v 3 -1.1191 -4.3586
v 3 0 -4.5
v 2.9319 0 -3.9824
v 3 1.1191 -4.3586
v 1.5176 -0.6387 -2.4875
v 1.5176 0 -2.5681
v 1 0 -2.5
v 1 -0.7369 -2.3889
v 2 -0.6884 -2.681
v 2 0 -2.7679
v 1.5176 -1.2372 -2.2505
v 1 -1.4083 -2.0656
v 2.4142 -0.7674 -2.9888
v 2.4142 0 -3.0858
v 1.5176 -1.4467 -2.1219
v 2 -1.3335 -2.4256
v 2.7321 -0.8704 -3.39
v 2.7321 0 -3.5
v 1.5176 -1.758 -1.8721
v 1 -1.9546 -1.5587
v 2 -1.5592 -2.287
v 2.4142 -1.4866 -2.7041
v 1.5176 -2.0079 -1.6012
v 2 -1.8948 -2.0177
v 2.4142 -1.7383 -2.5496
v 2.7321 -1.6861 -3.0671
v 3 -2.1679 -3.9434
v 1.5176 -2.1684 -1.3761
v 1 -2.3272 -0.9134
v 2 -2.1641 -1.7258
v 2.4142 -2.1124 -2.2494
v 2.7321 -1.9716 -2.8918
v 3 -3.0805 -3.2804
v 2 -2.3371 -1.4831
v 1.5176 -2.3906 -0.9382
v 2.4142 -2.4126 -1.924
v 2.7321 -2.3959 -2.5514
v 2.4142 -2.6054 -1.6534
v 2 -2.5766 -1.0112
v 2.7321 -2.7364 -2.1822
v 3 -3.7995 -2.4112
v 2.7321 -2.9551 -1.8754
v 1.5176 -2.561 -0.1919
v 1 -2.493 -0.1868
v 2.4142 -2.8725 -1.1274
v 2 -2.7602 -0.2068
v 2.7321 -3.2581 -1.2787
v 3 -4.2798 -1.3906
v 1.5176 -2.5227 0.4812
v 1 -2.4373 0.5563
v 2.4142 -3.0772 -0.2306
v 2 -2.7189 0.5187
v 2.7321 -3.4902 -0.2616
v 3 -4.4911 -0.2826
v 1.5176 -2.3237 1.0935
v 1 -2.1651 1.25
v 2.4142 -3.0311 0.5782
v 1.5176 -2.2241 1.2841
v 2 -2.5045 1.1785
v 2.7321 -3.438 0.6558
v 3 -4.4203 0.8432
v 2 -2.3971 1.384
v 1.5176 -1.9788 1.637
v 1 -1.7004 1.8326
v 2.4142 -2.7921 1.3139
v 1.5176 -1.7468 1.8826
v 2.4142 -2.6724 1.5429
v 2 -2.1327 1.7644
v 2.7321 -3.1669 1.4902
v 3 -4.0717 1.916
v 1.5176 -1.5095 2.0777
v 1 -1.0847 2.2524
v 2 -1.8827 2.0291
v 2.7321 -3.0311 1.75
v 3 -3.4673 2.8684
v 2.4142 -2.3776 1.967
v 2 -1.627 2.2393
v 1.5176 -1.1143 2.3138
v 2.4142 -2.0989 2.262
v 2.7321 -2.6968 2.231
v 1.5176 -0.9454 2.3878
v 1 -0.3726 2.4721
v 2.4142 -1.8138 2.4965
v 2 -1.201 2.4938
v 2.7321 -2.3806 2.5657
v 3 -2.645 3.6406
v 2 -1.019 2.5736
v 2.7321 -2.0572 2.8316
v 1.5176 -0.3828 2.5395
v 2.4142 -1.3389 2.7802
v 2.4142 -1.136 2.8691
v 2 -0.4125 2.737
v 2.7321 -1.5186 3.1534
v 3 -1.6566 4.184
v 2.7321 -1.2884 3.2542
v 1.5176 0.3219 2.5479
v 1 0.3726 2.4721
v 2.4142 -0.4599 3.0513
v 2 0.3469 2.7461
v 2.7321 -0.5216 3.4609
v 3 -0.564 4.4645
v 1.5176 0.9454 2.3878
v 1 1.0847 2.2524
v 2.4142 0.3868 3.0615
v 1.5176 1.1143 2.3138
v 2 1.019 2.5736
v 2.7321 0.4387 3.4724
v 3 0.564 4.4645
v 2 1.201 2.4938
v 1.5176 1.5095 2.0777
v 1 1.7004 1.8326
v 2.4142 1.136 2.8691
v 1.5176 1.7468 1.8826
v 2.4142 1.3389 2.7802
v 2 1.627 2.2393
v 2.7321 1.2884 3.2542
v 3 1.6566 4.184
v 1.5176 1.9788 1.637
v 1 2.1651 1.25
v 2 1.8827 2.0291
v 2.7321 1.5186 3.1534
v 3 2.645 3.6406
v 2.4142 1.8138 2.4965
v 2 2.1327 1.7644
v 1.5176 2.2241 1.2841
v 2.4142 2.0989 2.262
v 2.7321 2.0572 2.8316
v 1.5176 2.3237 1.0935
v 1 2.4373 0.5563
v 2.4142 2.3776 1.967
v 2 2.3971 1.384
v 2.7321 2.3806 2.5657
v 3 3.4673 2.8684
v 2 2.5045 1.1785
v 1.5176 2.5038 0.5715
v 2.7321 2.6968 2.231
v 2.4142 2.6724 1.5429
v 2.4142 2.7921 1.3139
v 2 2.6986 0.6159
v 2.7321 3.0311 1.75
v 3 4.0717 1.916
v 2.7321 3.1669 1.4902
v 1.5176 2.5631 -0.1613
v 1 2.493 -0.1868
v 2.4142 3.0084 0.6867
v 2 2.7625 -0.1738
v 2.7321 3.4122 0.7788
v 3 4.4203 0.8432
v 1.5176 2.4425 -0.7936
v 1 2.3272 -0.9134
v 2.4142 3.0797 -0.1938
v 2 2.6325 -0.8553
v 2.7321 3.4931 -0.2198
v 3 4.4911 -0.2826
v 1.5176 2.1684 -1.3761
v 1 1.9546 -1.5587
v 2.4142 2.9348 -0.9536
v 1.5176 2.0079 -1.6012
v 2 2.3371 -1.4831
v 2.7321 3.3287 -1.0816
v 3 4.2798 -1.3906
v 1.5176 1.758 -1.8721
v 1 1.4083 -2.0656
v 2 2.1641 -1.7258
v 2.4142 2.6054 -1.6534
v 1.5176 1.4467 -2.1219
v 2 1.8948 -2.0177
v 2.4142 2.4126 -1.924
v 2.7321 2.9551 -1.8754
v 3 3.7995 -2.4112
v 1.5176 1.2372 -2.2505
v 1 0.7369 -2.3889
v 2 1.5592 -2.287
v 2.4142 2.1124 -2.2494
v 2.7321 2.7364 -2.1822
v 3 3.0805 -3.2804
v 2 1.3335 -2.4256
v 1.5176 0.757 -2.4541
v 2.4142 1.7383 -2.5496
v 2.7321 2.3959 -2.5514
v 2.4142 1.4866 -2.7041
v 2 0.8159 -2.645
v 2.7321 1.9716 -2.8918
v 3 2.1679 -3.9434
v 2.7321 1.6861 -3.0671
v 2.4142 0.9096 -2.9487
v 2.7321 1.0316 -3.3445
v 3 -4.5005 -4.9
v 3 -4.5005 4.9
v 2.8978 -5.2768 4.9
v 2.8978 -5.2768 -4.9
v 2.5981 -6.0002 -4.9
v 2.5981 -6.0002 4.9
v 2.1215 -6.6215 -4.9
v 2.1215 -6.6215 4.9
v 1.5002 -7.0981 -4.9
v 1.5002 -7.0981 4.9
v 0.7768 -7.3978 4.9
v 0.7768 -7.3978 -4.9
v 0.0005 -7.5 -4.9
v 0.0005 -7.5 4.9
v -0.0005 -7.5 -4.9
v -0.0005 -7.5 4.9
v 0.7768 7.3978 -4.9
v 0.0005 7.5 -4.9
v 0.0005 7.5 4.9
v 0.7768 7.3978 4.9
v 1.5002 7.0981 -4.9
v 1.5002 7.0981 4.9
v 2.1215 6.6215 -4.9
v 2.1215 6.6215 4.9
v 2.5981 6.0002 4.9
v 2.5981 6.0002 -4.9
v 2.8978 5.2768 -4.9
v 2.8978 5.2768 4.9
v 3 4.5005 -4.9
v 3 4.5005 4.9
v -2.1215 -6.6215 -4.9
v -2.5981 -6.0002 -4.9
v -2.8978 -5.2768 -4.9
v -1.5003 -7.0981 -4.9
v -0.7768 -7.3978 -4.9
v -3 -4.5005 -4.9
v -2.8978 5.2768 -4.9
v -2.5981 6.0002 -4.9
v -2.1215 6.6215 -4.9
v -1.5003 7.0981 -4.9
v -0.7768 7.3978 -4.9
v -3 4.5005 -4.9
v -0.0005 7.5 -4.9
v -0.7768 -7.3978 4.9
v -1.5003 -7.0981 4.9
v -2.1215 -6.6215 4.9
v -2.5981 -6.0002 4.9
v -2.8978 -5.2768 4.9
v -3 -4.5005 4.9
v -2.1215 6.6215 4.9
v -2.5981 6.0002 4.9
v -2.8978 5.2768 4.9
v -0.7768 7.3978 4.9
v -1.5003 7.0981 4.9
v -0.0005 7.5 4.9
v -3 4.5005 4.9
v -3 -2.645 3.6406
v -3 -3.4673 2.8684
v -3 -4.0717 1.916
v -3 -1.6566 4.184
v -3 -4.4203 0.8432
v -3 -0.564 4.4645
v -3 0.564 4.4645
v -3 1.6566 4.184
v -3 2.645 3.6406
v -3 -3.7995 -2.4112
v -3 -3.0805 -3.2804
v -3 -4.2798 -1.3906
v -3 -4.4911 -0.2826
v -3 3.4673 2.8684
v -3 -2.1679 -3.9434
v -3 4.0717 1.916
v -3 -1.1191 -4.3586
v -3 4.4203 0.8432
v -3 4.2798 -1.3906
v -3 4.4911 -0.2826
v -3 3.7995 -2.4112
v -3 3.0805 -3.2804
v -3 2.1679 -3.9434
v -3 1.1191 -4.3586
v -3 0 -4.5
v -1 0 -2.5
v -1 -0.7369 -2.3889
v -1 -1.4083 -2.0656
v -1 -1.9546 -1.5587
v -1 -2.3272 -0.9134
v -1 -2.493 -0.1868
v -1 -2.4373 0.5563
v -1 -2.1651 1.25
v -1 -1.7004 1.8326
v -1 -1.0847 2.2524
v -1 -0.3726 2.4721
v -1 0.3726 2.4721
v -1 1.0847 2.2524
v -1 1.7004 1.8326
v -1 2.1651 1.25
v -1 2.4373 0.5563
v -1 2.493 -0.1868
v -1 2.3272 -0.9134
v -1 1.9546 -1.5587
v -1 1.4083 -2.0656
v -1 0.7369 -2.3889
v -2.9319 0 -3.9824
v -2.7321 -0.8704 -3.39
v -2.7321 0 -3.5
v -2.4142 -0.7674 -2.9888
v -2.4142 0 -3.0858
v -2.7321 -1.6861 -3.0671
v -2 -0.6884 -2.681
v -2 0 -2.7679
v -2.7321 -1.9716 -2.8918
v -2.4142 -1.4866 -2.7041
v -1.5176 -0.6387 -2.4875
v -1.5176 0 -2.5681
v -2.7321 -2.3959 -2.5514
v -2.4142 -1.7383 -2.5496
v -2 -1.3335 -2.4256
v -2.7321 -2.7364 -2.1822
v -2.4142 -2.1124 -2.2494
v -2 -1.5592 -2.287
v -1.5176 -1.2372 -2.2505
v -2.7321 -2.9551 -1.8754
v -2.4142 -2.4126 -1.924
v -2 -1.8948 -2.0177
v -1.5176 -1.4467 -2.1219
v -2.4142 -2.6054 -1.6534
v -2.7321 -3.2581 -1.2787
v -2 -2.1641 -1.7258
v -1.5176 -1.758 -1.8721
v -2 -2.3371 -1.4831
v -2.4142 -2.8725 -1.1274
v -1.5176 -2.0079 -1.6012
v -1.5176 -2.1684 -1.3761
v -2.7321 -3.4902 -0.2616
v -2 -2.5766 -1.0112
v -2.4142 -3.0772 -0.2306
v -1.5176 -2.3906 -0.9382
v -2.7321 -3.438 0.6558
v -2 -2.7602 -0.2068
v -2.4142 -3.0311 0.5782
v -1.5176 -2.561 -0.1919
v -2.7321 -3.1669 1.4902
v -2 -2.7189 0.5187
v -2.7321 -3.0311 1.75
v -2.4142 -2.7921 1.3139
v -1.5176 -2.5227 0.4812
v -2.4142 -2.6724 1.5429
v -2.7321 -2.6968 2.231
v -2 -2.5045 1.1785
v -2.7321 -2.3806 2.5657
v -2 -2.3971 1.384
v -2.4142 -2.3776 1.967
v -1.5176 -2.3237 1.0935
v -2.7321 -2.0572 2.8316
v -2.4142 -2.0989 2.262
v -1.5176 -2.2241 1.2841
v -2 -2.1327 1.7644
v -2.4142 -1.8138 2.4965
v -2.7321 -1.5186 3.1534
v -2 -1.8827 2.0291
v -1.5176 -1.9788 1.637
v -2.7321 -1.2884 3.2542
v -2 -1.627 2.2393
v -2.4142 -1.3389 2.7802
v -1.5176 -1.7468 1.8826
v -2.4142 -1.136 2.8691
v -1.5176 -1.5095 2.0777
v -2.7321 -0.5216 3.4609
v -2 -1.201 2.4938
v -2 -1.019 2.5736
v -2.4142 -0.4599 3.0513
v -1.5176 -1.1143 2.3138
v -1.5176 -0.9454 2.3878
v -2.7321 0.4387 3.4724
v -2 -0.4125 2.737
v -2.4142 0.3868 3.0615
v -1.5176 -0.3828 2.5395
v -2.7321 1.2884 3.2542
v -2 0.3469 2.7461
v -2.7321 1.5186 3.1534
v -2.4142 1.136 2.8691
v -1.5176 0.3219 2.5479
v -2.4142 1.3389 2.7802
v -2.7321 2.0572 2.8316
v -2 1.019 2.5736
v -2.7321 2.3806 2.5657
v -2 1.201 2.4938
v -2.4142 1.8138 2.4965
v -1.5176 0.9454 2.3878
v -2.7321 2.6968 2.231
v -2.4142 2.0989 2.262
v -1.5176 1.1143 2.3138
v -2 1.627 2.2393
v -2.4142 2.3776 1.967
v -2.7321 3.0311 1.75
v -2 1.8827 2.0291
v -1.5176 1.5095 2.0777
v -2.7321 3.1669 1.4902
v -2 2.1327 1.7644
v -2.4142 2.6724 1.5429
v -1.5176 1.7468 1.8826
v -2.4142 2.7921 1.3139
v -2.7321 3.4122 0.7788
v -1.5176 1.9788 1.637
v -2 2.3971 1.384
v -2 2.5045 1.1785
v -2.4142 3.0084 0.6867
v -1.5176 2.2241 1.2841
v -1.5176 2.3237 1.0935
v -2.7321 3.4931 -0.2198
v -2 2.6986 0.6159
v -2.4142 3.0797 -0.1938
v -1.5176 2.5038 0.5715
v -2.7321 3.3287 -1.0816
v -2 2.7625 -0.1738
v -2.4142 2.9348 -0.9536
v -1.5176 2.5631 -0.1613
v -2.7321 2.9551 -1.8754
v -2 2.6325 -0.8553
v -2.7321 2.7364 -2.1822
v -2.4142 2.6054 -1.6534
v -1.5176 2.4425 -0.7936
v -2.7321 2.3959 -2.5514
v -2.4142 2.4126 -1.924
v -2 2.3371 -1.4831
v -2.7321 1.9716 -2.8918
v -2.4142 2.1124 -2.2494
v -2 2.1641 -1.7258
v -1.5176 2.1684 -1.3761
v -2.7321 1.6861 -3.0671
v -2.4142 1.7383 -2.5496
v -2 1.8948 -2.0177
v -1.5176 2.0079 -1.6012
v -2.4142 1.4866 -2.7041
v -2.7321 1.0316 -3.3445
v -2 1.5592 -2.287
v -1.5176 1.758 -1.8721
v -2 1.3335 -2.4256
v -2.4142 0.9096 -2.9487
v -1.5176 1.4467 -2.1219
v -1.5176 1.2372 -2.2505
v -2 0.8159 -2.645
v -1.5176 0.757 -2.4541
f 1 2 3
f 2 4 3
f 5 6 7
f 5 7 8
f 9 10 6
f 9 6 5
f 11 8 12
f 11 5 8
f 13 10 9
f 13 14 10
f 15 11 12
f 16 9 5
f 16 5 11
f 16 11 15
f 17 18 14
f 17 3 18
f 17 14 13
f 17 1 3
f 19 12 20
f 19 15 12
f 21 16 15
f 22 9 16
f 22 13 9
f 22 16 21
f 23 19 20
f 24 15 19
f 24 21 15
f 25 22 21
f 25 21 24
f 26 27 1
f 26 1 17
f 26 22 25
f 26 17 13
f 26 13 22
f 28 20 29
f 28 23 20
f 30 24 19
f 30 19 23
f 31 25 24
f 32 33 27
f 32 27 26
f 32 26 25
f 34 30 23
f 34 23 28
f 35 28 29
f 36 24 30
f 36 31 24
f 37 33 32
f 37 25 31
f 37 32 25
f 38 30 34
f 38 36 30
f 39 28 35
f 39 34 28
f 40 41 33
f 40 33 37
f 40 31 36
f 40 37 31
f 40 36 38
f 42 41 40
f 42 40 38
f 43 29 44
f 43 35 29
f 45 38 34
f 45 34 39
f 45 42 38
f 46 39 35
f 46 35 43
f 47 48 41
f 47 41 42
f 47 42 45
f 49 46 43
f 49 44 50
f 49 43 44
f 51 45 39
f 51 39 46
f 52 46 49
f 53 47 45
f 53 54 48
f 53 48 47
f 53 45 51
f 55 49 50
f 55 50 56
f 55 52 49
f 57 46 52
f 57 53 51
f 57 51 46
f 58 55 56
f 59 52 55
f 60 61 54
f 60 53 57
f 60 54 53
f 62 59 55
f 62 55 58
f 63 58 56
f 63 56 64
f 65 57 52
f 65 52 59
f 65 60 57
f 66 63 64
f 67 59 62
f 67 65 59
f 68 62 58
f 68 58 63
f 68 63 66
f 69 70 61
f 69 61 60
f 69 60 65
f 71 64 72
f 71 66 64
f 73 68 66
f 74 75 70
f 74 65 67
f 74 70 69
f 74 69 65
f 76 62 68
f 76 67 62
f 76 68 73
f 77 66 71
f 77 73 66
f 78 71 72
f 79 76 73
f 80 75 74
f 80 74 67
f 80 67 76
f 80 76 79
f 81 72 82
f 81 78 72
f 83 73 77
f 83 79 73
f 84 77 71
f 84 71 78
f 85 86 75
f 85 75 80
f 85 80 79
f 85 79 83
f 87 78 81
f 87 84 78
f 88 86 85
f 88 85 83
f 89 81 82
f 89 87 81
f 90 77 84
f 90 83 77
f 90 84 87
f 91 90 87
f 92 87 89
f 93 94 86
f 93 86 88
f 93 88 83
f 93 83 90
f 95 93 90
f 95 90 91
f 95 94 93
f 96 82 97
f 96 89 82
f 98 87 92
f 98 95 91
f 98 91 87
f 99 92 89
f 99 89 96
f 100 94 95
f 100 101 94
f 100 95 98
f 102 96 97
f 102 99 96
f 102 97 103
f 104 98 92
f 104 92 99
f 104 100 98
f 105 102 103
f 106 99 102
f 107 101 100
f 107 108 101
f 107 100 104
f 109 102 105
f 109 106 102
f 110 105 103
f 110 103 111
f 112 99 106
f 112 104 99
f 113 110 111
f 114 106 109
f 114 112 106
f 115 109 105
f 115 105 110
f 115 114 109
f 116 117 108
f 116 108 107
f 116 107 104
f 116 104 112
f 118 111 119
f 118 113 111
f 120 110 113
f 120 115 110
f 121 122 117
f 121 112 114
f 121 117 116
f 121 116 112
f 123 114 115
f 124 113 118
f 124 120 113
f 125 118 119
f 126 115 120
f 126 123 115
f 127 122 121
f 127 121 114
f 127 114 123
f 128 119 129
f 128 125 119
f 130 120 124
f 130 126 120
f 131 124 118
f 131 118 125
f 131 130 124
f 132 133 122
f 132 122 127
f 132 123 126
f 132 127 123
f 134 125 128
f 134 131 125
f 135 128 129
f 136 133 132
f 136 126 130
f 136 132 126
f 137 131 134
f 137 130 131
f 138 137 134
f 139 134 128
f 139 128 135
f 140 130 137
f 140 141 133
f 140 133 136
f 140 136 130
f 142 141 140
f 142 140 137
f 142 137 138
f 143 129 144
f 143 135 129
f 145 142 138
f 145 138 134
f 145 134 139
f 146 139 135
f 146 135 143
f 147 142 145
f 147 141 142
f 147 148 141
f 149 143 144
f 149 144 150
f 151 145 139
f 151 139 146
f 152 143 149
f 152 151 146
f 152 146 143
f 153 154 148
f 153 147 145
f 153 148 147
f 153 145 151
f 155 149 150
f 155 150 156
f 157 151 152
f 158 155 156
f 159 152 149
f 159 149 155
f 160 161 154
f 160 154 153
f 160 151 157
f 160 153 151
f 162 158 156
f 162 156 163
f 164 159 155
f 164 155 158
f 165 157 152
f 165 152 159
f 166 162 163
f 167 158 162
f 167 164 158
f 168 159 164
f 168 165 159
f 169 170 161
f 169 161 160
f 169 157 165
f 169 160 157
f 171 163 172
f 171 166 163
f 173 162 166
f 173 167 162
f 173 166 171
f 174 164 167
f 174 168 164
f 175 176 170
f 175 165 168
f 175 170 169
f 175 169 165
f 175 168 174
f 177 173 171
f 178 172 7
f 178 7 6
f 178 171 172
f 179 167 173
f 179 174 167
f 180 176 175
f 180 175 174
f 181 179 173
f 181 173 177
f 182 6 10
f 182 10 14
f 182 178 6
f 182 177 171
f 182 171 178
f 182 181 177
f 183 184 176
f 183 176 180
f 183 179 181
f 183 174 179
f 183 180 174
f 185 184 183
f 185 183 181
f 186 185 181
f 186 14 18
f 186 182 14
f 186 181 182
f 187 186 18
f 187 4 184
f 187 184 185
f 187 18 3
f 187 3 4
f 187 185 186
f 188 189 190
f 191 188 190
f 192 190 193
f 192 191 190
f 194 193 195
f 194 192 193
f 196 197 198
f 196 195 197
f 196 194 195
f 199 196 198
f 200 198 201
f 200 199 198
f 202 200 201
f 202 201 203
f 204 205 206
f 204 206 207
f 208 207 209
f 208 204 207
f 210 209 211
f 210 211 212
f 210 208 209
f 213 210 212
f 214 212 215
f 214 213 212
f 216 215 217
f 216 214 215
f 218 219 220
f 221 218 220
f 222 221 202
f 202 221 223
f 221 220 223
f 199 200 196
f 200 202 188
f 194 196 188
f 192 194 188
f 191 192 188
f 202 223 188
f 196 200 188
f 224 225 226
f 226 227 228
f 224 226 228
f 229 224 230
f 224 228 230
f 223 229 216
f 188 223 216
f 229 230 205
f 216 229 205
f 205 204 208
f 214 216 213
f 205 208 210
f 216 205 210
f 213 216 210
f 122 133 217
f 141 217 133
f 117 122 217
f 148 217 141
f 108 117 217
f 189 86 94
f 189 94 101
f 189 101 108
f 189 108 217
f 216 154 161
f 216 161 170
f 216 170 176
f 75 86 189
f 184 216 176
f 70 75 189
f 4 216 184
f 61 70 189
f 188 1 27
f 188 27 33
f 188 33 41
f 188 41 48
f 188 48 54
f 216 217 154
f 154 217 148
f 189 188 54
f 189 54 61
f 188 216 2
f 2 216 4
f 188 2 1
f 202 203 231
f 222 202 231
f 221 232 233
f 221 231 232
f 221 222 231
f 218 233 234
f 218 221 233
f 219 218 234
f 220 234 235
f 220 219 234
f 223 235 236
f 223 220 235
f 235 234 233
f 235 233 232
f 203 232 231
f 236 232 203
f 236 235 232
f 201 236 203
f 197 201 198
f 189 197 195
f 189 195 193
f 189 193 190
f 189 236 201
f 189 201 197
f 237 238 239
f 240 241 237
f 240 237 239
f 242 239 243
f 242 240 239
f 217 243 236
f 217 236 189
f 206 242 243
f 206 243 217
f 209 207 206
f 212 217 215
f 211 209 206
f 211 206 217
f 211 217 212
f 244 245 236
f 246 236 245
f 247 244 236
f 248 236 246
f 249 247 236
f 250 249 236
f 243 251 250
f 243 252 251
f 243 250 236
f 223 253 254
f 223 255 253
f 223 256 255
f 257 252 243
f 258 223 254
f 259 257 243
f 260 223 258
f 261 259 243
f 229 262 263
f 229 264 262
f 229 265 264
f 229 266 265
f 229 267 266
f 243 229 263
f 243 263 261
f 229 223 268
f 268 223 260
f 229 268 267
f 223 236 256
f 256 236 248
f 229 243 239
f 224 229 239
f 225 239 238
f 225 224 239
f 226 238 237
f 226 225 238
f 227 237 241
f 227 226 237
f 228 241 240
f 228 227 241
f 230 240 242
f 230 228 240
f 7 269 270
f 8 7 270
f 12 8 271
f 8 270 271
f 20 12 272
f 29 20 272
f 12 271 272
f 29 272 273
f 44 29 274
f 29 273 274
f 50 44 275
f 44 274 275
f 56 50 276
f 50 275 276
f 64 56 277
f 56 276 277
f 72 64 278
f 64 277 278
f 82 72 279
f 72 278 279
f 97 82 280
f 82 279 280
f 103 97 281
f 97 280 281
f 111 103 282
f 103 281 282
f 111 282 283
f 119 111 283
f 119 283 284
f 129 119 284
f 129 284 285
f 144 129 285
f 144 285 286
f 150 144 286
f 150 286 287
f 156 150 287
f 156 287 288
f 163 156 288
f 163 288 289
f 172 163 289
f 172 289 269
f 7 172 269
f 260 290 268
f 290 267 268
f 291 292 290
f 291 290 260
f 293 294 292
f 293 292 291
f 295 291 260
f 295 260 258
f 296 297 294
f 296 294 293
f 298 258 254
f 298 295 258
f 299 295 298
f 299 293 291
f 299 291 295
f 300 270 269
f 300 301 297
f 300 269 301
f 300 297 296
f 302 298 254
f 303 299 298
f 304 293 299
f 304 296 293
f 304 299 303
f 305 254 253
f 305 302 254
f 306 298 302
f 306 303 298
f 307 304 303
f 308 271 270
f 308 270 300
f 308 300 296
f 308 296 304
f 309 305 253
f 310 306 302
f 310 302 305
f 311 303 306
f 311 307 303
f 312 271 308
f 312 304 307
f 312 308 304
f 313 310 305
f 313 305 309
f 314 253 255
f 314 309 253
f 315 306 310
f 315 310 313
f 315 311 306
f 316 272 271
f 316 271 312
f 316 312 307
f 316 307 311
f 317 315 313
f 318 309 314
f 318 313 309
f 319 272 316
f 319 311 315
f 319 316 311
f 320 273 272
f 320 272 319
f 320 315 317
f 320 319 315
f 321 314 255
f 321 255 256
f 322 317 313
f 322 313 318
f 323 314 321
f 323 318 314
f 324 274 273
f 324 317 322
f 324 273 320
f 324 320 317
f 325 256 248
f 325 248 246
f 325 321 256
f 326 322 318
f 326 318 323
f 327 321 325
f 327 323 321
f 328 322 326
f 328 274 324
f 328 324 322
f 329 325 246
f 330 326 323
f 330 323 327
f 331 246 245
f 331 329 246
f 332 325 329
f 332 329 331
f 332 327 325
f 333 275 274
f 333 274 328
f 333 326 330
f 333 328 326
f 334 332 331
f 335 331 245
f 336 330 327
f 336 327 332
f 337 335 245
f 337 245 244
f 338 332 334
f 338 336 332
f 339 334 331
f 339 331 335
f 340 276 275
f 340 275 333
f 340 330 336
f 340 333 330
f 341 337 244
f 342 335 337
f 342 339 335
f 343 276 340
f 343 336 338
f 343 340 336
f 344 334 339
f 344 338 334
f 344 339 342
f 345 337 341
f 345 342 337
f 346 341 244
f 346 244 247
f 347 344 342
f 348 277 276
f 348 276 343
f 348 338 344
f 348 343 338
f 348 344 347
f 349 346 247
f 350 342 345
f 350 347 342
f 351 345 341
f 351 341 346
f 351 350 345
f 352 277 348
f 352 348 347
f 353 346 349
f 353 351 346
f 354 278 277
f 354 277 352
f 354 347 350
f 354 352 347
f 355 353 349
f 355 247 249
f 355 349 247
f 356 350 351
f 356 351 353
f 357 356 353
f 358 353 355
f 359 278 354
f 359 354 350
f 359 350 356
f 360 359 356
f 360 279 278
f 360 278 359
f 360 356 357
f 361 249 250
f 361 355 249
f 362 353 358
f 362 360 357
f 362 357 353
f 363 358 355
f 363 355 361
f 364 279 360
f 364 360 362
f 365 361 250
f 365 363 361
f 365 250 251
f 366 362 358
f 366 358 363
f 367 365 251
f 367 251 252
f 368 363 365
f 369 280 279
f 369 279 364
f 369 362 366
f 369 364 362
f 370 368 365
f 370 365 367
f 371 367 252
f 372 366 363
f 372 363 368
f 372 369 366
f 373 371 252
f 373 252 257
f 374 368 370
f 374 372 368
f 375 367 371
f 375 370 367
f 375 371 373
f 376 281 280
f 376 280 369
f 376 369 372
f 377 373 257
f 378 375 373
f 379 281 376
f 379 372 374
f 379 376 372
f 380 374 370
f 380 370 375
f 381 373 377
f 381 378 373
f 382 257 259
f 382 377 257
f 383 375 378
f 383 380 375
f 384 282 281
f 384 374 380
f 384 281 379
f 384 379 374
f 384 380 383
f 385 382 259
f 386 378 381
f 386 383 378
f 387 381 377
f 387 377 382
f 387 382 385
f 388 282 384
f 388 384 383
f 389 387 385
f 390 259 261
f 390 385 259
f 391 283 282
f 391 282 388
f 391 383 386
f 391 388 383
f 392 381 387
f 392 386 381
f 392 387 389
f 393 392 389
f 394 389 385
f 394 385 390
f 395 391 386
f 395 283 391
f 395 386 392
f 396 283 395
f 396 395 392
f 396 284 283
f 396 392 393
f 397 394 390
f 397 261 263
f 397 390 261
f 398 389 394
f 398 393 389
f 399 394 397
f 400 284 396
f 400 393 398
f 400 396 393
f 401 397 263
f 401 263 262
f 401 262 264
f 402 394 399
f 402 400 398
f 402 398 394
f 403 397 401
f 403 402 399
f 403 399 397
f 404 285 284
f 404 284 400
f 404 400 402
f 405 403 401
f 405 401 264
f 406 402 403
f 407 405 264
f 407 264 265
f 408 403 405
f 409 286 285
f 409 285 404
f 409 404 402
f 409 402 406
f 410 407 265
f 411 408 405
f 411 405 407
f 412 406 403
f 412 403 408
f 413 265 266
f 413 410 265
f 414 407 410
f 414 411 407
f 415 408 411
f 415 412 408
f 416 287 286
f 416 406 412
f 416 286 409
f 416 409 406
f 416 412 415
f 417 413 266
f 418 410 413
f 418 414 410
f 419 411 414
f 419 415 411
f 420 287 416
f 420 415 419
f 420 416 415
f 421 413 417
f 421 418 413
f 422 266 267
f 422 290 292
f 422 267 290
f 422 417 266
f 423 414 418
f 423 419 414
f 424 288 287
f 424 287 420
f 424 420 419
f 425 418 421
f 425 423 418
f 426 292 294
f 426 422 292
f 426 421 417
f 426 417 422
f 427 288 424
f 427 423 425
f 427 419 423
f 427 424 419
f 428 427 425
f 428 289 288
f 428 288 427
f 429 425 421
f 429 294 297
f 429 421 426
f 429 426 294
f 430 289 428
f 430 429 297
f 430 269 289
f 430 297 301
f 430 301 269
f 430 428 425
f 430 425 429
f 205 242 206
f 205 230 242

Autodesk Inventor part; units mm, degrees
ref_plane "YZ Plane" through (0, 0, 0) normal (1, 0, 0) x (0, 1, 0)
ref_plane "XZ Plane" through (0, 0, 0) normal (0, 1, 0) x (-1, 0, 0)
ref_plane "XY Plane" through (0, 0, 0) normal (0, 0, 1) x (1, 0, 0)
sketch "Sketch1" plane through (0, 0, 0) normal (0, 0, 1) x (1, 0, 0)
  line L0 (-4.2, 0) -> (4.2, 0) projected
  line L1 (0, -1.5) -> (0, 9) projected
  line L2 (-3, 7.5) -> (3, 7.5)
  line L3 (3, 7.5) -> (3, 0)
  line L4 (3, 0) -> (-3, 0)
  line L5 (-3, 0) -> (-3, 7.5)
  point P0 (0, 0)
  point P1 (0, 0)
  dimension "d0" = 6
  dimension "d1" = 7.5
extrude "Extrusion1" add sketch "Sketch1" along normal mid plane 9.8
fillet "Fillet1" radius 3 2 edges at (3, 7.5, 0) (-3, 7.5, 0)
mirror "Mirror1" about plane through (-3, 0, 0) normal (0, -1, 0)
sketch "Sketch2" plane through (3, 4.5, 4.9) normal (1, 0, 0) x (0, 0, -1)
  point P0 (4.9, -4.5)
hole "Hole1" at (3, 0, 0) direction (-1, 0, 0) diameter 5 end through all
fillet "Fillet2" radius 2 2 edges at (3, 0, 2.5) (-3, 0, 2.5)
properties part number "P103" material "ABS Plastic"
